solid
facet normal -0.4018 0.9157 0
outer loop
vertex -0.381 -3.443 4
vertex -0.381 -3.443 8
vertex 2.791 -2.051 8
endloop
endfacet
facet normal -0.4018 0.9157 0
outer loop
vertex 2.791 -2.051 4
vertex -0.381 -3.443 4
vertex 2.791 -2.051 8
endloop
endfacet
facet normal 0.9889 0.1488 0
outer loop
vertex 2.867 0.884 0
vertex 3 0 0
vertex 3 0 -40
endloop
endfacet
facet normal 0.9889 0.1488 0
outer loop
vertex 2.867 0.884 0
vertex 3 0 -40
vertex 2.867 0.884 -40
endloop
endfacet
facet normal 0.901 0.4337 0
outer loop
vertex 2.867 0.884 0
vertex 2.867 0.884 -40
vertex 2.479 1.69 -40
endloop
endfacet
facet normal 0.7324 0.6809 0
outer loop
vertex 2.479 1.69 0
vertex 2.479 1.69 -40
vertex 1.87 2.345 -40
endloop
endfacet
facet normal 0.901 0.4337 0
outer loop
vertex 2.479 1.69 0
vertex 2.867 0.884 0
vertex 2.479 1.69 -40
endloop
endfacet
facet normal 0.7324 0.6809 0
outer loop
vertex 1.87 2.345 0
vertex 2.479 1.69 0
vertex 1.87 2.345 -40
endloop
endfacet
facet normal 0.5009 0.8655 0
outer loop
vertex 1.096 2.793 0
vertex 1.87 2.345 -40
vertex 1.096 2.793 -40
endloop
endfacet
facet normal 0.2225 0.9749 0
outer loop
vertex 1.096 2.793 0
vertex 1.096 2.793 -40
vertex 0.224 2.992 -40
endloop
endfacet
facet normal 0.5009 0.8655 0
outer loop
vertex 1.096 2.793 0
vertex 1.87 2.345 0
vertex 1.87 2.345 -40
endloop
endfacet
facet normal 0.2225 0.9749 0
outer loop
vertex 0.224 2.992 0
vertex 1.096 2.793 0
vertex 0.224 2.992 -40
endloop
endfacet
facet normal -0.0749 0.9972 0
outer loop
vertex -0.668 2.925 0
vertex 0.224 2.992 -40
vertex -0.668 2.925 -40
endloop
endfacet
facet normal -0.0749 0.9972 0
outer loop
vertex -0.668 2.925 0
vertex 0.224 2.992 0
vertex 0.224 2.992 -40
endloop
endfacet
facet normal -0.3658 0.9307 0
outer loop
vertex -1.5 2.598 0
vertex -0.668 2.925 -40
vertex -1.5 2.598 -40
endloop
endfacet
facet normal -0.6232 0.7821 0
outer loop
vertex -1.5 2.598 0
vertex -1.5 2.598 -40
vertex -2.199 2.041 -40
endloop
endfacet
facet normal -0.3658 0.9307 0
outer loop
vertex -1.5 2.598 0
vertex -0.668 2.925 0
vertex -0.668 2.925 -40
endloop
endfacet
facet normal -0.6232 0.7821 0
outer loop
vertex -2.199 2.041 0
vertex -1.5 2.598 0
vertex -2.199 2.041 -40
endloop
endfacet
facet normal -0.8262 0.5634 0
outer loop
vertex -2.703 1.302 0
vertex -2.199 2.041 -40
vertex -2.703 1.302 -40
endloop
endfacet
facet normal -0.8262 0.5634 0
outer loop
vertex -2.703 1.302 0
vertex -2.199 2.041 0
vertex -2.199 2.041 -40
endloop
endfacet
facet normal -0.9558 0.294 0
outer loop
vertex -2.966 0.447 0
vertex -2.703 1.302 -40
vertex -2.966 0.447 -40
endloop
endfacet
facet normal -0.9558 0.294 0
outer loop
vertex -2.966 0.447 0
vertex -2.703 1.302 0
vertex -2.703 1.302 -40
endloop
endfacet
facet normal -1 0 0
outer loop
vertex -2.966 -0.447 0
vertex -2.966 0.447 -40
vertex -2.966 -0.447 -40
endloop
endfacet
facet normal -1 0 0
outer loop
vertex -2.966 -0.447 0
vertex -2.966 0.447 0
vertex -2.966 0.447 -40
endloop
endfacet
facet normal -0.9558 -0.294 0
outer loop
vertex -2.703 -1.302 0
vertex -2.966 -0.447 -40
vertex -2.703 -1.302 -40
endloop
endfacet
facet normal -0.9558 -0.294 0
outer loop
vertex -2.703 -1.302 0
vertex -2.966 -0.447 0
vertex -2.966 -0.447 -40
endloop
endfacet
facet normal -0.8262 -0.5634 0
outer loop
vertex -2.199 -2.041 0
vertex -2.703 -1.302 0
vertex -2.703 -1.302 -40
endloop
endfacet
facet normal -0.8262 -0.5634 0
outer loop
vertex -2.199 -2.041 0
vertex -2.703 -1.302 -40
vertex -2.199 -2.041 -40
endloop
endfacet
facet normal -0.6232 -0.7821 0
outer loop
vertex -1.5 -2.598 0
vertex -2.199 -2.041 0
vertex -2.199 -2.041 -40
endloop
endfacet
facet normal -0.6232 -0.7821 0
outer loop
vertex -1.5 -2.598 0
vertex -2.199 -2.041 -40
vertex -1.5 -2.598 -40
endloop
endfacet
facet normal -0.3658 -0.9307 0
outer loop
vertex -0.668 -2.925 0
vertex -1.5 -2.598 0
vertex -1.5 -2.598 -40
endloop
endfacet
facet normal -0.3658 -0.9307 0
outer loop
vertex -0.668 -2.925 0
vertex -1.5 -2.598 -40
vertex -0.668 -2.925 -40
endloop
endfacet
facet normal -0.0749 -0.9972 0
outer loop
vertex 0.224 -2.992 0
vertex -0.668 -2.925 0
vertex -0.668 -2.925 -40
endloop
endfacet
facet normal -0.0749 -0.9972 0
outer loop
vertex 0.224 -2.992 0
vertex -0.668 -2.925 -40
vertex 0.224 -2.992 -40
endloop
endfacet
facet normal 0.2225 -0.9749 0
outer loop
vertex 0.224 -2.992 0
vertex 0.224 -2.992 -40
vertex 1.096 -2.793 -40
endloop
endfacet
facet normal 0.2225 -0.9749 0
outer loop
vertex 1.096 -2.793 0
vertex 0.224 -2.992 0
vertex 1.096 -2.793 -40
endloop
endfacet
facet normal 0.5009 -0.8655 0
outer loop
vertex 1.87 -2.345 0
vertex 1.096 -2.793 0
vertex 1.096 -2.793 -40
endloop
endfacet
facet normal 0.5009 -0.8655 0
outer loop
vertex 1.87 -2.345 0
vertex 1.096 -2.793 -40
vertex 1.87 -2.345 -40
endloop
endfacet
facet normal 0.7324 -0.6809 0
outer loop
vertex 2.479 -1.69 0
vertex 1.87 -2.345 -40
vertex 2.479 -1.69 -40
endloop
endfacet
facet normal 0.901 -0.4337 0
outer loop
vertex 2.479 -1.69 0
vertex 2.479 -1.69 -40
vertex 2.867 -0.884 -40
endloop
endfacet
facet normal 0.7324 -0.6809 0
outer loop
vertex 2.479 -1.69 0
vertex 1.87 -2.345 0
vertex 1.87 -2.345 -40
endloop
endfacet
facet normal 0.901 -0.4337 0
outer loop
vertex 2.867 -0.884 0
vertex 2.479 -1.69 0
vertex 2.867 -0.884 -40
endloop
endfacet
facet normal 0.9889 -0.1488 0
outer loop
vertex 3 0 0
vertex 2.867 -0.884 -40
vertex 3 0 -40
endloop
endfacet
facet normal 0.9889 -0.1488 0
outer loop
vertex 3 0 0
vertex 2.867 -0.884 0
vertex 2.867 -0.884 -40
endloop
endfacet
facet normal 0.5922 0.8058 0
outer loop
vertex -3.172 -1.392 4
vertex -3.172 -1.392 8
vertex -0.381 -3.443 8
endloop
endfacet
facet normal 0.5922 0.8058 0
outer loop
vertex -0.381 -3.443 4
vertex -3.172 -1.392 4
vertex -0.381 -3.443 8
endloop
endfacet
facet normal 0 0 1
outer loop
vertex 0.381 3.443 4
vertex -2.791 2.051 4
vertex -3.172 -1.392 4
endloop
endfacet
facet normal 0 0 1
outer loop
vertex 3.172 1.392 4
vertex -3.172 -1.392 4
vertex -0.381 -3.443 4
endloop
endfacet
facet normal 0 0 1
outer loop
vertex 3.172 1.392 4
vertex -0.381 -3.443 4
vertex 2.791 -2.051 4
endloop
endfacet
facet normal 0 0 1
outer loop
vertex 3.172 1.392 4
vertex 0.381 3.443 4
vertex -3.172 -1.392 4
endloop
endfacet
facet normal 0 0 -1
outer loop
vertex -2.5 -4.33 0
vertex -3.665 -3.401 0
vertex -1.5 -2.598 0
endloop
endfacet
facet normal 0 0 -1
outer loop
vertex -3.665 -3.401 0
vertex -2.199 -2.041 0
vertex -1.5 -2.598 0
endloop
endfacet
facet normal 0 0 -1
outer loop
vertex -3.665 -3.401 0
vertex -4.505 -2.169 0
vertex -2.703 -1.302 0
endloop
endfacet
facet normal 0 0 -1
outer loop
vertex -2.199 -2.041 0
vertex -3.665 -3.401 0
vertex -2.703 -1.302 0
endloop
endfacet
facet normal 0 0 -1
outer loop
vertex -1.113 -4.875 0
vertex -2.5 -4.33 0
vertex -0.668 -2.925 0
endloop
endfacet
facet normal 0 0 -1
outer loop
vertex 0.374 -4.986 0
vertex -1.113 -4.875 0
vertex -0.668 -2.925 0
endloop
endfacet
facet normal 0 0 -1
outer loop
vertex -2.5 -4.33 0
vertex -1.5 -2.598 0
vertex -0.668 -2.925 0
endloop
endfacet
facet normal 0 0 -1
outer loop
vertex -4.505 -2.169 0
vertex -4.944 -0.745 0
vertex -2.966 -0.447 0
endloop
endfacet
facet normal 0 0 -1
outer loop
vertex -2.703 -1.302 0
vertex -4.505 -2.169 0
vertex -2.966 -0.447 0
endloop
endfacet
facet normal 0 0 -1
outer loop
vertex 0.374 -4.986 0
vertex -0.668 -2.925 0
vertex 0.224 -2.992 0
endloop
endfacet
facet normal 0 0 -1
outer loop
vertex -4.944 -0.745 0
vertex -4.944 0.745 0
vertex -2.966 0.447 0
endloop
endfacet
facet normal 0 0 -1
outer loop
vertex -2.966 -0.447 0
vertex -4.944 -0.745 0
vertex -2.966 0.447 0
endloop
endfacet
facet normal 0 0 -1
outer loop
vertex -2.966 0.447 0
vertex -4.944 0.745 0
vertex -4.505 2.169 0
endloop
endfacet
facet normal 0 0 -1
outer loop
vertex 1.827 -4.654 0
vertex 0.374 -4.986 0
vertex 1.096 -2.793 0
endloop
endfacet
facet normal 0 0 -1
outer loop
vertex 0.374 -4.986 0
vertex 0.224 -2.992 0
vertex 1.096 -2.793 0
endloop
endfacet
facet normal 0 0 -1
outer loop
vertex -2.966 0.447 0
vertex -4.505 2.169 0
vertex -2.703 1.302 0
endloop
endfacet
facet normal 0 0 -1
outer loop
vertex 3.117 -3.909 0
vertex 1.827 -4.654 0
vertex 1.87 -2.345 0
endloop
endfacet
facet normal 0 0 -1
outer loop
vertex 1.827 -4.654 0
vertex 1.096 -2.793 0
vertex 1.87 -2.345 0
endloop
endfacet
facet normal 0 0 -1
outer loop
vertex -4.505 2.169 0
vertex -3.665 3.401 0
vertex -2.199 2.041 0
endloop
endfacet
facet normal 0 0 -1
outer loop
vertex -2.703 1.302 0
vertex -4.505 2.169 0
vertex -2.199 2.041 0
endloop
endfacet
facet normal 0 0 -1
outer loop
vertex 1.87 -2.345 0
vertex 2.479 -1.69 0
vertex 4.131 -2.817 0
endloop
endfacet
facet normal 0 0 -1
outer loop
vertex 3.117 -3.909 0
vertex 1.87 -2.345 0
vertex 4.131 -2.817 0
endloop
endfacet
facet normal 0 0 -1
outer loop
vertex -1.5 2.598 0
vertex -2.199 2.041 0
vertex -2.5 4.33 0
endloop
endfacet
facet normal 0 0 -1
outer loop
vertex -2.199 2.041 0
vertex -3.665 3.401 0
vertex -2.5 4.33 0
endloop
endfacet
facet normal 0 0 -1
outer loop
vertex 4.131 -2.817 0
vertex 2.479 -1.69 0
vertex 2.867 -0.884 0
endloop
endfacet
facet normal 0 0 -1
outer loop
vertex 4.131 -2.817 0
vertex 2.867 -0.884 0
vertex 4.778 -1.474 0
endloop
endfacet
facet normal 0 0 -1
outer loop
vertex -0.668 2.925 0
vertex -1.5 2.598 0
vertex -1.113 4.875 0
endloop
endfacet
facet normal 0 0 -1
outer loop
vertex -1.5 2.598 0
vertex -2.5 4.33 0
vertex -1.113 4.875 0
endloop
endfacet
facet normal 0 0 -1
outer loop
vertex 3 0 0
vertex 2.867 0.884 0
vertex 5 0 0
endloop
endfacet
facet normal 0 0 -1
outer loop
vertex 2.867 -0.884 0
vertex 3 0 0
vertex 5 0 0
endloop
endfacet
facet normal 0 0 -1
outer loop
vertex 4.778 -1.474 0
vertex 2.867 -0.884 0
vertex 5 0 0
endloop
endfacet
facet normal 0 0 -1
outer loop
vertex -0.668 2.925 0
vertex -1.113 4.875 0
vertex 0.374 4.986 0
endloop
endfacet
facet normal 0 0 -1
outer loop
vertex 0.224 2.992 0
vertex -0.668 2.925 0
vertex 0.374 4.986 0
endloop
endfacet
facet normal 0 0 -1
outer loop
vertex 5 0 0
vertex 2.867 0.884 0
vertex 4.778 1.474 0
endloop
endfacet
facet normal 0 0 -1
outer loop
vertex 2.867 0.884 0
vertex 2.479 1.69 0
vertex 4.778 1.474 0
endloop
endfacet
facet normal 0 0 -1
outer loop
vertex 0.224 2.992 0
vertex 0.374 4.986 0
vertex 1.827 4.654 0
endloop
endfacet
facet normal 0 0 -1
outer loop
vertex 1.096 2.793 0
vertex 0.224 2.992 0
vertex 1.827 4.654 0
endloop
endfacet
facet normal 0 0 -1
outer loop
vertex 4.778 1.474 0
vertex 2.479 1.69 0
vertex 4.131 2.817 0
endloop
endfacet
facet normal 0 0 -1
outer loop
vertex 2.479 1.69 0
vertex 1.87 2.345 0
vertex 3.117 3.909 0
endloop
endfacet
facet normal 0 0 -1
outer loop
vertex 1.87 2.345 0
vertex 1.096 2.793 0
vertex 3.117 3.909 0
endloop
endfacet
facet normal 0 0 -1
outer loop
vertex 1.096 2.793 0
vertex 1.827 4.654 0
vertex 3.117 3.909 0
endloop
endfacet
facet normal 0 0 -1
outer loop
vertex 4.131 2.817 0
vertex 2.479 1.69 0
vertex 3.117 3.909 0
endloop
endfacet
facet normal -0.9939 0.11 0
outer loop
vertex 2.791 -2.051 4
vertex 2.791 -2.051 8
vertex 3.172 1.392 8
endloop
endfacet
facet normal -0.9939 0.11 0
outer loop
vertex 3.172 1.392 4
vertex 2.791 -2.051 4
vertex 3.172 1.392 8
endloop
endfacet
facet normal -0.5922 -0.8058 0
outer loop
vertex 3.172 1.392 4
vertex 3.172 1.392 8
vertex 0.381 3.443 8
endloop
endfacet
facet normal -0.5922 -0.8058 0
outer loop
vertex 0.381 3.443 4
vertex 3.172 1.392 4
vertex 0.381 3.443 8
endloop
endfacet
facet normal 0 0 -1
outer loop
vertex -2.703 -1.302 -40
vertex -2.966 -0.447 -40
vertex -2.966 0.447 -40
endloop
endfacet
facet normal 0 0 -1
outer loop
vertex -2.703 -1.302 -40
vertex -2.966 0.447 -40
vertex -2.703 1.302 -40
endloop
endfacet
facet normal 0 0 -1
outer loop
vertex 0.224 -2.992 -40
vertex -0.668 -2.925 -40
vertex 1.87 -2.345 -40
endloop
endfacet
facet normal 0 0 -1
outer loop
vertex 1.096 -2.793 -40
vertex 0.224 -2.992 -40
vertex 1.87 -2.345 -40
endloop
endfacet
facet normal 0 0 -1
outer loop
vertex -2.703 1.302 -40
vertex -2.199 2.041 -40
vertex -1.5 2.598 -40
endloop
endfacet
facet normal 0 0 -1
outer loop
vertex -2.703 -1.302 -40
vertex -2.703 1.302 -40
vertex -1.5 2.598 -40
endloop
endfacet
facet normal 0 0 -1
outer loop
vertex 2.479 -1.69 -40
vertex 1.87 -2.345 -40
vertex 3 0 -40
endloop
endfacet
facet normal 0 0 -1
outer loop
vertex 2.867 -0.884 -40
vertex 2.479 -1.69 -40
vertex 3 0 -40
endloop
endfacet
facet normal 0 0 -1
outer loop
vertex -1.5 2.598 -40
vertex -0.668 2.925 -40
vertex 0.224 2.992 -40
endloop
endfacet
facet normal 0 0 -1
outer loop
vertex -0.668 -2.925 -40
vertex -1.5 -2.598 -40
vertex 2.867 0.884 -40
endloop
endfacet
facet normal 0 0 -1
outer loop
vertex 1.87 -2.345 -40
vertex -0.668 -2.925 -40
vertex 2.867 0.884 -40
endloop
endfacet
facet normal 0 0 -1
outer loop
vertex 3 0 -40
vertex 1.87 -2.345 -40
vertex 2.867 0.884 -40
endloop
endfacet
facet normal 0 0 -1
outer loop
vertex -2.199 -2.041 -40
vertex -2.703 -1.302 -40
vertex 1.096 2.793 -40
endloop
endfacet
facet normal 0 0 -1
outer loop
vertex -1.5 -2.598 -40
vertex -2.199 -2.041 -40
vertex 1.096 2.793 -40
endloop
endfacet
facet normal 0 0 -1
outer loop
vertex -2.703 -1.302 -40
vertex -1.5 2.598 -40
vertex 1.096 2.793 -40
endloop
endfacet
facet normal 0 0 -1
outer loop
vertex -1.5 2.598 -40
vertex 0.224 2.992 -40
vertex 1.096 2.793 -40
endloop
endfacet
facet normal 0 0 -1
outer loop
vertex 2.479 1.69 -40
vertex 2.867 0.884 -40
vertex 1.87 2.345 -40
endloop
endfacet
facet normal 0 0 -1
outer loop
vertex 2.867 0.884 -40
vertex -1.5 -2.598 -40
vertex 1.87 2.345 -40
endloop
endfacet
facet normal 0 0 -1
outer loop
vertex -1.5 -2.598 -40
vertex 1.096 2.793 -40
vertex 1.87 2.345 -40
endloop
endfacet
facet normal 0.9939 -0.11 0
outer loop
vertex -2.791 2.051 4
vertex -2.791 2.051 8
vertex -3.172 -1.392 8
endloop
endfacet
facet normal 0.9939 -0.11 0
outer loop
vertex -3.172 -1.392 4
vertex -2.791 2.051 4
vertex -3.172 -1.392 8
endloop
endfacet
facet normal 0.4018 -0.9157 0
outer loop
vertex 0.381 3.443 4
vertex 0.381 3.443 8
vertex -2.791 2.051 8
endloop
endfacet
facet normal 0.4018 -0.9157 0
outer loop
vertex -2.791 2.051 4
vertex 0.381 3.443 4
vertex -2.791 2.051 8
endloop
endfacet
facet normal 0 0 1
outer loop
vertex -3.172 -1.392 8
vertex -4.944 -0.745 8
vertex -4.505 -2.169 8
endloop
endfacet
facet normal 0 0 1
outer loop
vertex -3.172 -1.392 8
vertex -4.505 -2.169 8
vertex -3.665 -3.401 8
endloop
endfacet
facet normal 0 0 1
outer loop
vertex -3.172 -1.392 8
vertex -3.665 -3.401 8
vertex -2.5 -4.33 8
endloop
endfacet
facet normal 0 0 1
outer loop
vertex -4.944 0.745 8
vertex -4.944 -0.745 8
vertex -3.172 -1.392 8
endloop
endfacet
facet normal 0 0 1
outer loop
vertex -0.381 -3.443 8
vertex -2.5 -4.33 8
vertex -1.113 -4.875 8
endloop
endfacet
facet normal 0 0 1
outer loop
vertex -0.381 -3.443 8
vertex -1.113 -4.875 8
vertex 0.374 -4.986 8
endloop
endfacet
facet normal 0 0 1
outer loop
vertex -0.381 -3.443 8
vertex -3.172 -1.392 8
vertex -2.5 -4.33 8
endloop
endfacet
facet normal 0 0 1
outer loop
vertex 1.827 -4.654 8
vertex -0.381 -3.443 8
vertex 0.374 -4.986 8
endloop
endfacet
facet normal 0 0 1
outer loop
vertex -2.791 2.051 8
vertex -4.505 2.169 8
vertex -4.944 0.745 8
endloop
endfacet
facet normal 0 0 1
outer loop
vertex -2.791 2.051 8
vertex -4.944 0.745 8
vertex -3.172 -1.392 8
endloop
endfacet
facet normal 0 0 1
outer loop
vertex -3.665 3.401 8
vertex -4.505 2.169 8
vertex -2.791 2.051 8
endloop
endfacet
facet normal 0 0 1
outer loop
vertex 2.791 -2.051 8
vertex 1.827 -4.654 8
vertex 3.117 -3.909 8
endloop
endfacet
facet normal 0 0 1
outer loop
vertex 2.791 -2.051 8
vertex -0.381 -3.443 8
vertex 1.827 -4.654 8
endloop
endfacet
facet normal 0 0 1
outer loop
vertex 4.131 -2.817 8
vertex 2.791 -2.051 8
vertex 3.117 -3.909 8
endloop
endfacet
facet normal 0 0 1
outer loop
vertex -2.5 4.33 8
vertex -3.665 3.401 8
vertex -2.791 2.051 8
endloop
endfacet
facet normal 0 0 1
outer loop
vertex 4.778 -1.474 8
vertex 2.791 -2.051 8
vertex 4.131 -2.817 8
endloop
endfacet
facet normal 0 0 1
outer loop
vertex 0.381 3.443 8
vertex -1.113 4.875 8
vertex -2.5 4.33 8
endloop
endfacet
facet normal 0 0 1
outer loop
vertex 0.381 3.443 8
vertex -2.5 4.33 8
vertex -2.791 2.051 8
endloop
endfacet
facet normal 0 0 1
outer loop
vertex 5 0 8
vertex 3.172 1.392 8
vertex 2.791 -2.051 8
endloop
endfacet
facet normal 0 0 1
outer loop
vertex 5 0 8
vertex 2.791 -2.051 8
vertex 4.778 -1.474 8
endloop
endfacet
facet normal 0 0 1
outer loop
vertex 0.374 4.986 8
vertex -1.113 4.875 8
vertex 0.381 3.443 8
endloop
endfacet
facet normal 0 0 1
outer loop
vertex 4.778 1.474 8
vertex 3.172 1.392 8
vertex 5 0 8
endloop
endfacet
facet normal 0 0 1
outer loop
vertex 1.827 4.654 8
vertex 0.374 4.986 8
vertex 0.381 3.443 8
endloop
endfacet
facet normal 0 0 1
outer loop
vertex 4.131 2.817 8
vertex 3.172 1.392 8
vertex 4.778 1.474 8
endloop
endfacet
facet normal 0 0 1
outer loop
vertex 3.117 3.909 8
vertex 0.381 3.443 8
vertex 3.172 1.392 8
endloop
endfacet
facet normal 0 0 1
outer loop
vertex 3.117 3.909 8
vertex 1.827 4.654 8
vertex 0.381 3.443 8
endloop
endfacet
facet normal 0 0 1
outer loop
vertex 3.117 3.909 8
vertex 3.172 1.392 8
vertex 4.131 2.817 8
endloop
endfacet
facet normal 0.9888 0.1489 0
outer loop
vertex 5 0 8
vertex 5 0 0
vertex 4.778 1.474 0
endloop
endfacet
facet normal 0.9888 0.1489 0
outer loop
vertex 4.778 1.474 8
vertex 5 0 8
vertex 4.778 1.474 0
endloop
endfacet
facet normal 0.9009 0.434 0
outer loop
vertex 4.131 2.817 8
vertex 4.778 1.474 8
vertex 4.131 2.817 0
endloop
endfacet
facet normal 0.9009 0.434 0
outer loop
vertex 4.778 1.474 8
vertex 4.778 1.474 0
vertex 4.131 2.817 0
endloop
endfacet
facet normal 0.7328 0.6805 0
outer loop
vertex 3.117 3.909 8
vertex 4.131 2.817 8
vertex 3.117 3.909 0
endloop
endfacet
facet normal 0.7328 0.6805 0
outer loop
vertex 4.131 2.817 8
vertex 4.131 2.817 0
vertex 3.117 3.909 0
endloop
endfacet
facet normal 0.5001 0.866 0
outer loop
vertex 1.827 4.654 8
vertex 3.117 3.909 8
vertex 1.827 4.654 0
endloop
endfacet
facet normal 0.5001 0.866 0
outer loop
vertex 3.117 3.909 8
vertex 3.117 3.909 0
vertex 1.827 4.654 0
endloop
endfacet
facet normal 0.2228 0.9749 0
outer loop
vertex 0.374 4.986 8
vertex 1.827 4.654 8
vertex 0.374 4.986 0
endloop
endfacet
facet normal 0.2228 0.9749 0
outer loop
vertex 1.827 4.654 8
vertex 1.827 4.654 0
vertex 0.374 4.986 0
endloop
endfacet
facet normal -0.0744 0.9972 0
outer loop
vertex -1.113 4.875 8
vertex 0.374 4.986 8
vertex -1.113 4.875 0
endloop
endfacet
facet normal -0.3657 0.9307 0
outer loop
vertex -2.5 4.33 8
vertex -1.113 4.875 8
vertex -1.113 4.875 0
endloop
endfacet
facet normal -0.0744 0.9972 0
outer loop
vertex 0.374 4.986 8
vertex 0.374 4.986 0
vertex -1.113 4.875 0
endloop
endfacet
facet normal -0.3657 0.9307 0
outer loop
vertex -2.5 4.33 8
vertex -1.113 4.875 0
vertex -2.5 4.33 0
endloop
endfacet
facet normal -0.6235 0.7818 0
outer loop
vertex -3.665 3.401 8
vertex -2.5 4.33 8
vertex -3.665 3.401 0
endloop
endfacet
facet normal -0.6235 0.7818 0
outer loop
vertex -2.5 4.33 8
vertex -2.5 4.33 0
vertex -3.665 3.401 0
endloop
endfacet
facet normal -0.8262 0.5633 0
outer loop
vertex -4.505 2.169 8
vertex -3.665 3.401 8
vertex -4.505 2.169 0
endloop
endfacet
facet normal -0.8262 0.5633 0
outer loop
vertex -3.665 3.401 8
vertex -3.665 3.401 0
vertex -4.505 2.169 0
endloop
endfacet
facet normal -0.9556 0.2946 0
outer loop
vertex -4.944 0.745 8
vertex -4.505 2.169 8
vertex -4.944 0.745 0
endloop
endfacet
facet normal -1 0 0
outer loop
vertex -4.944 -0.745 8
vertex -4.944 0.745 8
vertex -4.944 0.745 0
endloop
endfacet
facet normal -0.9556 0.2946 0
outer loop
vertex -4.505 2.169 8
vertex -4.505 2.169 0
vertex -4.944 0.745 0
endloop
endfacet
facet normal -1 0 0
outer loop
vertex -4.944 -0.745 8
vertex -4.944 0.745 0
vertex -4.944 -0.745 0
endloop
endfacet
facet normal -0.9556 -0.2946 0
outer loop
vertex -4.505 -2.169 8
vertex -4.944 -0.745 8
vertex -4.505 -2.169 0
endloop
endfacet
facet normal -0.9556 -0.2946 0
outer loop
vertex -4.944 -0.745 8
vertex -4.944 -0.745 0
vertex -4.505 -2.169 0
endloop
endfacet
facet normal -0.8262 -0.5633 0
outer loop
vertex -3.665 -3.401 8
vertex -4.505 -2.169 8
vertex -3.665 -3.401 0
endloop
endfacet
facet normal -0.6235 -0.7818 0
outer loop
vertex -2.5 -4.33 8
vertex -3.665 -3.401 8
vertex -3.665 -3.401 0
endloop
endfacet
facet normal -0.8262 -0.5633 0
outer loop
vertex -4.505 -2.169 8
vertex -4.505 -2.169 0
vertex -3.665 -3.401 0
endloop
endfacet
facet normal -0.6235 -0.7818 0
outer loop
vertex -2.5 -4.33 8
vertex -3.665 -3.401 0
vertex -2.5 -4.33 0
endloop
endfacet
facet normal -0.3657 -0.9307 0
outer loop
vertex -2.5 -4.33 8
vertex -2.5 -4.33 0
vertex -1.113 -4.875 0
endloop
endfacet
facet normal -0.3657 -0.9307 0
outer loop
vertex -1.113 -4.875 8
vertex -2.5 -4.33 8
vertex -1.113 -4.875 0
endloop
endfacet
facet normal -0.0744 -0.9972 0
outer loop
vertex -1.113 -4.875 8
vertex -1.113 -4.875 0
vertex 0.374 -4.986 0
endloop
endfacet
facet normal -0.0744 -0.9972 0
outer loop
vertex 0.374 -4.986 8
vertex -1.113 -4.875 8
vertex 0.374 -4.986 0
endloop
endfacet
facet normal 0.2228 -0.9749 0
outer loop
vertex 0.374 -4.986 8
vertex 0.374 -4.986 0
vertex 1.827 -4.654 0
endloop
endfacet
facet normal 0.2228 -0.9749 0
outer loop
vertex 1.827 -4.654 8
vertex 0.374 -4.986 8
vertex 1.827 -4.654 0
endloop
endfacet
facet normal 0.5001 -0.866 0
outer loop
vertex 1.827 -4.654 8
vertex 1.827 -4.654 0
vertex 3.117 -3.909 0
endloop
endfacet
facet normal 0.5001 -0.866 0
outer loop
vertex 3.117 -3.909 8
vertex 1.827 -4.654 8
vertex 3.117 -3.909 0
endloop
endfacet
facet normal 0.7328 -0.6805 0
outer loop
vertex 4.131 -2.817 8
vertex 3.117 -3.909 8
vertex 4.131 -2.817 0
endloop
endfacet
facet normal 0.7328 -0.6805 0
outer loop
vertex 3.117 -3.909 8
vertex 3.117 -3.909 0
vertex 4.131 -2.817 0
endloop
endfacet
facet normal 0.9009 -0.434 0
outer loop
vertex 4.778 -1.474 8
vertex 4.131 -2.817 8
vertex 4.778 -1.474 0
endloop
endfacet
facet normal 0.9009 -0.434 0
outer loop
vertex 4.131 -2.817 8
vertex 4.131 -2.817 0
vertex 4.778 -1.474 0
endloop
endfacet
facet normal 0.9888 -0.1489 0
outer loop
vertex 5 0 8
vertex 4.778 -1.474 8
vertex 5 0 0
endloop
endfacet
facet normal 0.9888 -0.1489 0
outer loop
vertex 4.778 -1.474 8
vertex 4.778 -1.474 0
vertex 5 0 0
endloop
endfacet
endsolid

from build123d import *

# Parameters (mm, degrees)
SZKIC1_R                    = 5
DODANIE_WYCI_GNI_CIE1_DEPTH = 8
SZKIC2_R                    = 3
DODANIE_WYCI_GNI_CIE2_DEPTH = 40
WYTNIJ_WYCI_GNI_CIE1_DEPTH  = 4


with BuildPart() as part:
    # Szkic1 → Dodanie-wyciągnięcie1 (new body)
    with BuildSketch(Plane.XY):
        Circle(SZKIC1_R)
    extrude(amount=DODANIE_WYCI_GNI_CIE1_DEPTH)

    # Szkic2 → Dodanie-wyciągnięcie2 (add)
    with BuildSketch(Plane.XY):
        Circle(SZKIC2_R)
    extrude(amount=-DODANIE_WYCI_GNI_CIE2_DEPTH)

    # Szkic3 → Wytnij-wyciągnięcie1 (cut)
    with BuildSketch(Plane.XY.offset(8)):
        Polygon((2.791473495, -2.051261985), (3.172181736, 1.391855968), (0.380708241, 3.443117953), (-2.791473495, 2.051261985), (-3.172181736, -1.391855968), (-0.380708241, -3.443117953), align=None)
    extrude(amount=-WYTNIJ_WYCI_GNI_CIE1_DEPTH, mode=Mode.SUBTRACT)


solid = part.part
